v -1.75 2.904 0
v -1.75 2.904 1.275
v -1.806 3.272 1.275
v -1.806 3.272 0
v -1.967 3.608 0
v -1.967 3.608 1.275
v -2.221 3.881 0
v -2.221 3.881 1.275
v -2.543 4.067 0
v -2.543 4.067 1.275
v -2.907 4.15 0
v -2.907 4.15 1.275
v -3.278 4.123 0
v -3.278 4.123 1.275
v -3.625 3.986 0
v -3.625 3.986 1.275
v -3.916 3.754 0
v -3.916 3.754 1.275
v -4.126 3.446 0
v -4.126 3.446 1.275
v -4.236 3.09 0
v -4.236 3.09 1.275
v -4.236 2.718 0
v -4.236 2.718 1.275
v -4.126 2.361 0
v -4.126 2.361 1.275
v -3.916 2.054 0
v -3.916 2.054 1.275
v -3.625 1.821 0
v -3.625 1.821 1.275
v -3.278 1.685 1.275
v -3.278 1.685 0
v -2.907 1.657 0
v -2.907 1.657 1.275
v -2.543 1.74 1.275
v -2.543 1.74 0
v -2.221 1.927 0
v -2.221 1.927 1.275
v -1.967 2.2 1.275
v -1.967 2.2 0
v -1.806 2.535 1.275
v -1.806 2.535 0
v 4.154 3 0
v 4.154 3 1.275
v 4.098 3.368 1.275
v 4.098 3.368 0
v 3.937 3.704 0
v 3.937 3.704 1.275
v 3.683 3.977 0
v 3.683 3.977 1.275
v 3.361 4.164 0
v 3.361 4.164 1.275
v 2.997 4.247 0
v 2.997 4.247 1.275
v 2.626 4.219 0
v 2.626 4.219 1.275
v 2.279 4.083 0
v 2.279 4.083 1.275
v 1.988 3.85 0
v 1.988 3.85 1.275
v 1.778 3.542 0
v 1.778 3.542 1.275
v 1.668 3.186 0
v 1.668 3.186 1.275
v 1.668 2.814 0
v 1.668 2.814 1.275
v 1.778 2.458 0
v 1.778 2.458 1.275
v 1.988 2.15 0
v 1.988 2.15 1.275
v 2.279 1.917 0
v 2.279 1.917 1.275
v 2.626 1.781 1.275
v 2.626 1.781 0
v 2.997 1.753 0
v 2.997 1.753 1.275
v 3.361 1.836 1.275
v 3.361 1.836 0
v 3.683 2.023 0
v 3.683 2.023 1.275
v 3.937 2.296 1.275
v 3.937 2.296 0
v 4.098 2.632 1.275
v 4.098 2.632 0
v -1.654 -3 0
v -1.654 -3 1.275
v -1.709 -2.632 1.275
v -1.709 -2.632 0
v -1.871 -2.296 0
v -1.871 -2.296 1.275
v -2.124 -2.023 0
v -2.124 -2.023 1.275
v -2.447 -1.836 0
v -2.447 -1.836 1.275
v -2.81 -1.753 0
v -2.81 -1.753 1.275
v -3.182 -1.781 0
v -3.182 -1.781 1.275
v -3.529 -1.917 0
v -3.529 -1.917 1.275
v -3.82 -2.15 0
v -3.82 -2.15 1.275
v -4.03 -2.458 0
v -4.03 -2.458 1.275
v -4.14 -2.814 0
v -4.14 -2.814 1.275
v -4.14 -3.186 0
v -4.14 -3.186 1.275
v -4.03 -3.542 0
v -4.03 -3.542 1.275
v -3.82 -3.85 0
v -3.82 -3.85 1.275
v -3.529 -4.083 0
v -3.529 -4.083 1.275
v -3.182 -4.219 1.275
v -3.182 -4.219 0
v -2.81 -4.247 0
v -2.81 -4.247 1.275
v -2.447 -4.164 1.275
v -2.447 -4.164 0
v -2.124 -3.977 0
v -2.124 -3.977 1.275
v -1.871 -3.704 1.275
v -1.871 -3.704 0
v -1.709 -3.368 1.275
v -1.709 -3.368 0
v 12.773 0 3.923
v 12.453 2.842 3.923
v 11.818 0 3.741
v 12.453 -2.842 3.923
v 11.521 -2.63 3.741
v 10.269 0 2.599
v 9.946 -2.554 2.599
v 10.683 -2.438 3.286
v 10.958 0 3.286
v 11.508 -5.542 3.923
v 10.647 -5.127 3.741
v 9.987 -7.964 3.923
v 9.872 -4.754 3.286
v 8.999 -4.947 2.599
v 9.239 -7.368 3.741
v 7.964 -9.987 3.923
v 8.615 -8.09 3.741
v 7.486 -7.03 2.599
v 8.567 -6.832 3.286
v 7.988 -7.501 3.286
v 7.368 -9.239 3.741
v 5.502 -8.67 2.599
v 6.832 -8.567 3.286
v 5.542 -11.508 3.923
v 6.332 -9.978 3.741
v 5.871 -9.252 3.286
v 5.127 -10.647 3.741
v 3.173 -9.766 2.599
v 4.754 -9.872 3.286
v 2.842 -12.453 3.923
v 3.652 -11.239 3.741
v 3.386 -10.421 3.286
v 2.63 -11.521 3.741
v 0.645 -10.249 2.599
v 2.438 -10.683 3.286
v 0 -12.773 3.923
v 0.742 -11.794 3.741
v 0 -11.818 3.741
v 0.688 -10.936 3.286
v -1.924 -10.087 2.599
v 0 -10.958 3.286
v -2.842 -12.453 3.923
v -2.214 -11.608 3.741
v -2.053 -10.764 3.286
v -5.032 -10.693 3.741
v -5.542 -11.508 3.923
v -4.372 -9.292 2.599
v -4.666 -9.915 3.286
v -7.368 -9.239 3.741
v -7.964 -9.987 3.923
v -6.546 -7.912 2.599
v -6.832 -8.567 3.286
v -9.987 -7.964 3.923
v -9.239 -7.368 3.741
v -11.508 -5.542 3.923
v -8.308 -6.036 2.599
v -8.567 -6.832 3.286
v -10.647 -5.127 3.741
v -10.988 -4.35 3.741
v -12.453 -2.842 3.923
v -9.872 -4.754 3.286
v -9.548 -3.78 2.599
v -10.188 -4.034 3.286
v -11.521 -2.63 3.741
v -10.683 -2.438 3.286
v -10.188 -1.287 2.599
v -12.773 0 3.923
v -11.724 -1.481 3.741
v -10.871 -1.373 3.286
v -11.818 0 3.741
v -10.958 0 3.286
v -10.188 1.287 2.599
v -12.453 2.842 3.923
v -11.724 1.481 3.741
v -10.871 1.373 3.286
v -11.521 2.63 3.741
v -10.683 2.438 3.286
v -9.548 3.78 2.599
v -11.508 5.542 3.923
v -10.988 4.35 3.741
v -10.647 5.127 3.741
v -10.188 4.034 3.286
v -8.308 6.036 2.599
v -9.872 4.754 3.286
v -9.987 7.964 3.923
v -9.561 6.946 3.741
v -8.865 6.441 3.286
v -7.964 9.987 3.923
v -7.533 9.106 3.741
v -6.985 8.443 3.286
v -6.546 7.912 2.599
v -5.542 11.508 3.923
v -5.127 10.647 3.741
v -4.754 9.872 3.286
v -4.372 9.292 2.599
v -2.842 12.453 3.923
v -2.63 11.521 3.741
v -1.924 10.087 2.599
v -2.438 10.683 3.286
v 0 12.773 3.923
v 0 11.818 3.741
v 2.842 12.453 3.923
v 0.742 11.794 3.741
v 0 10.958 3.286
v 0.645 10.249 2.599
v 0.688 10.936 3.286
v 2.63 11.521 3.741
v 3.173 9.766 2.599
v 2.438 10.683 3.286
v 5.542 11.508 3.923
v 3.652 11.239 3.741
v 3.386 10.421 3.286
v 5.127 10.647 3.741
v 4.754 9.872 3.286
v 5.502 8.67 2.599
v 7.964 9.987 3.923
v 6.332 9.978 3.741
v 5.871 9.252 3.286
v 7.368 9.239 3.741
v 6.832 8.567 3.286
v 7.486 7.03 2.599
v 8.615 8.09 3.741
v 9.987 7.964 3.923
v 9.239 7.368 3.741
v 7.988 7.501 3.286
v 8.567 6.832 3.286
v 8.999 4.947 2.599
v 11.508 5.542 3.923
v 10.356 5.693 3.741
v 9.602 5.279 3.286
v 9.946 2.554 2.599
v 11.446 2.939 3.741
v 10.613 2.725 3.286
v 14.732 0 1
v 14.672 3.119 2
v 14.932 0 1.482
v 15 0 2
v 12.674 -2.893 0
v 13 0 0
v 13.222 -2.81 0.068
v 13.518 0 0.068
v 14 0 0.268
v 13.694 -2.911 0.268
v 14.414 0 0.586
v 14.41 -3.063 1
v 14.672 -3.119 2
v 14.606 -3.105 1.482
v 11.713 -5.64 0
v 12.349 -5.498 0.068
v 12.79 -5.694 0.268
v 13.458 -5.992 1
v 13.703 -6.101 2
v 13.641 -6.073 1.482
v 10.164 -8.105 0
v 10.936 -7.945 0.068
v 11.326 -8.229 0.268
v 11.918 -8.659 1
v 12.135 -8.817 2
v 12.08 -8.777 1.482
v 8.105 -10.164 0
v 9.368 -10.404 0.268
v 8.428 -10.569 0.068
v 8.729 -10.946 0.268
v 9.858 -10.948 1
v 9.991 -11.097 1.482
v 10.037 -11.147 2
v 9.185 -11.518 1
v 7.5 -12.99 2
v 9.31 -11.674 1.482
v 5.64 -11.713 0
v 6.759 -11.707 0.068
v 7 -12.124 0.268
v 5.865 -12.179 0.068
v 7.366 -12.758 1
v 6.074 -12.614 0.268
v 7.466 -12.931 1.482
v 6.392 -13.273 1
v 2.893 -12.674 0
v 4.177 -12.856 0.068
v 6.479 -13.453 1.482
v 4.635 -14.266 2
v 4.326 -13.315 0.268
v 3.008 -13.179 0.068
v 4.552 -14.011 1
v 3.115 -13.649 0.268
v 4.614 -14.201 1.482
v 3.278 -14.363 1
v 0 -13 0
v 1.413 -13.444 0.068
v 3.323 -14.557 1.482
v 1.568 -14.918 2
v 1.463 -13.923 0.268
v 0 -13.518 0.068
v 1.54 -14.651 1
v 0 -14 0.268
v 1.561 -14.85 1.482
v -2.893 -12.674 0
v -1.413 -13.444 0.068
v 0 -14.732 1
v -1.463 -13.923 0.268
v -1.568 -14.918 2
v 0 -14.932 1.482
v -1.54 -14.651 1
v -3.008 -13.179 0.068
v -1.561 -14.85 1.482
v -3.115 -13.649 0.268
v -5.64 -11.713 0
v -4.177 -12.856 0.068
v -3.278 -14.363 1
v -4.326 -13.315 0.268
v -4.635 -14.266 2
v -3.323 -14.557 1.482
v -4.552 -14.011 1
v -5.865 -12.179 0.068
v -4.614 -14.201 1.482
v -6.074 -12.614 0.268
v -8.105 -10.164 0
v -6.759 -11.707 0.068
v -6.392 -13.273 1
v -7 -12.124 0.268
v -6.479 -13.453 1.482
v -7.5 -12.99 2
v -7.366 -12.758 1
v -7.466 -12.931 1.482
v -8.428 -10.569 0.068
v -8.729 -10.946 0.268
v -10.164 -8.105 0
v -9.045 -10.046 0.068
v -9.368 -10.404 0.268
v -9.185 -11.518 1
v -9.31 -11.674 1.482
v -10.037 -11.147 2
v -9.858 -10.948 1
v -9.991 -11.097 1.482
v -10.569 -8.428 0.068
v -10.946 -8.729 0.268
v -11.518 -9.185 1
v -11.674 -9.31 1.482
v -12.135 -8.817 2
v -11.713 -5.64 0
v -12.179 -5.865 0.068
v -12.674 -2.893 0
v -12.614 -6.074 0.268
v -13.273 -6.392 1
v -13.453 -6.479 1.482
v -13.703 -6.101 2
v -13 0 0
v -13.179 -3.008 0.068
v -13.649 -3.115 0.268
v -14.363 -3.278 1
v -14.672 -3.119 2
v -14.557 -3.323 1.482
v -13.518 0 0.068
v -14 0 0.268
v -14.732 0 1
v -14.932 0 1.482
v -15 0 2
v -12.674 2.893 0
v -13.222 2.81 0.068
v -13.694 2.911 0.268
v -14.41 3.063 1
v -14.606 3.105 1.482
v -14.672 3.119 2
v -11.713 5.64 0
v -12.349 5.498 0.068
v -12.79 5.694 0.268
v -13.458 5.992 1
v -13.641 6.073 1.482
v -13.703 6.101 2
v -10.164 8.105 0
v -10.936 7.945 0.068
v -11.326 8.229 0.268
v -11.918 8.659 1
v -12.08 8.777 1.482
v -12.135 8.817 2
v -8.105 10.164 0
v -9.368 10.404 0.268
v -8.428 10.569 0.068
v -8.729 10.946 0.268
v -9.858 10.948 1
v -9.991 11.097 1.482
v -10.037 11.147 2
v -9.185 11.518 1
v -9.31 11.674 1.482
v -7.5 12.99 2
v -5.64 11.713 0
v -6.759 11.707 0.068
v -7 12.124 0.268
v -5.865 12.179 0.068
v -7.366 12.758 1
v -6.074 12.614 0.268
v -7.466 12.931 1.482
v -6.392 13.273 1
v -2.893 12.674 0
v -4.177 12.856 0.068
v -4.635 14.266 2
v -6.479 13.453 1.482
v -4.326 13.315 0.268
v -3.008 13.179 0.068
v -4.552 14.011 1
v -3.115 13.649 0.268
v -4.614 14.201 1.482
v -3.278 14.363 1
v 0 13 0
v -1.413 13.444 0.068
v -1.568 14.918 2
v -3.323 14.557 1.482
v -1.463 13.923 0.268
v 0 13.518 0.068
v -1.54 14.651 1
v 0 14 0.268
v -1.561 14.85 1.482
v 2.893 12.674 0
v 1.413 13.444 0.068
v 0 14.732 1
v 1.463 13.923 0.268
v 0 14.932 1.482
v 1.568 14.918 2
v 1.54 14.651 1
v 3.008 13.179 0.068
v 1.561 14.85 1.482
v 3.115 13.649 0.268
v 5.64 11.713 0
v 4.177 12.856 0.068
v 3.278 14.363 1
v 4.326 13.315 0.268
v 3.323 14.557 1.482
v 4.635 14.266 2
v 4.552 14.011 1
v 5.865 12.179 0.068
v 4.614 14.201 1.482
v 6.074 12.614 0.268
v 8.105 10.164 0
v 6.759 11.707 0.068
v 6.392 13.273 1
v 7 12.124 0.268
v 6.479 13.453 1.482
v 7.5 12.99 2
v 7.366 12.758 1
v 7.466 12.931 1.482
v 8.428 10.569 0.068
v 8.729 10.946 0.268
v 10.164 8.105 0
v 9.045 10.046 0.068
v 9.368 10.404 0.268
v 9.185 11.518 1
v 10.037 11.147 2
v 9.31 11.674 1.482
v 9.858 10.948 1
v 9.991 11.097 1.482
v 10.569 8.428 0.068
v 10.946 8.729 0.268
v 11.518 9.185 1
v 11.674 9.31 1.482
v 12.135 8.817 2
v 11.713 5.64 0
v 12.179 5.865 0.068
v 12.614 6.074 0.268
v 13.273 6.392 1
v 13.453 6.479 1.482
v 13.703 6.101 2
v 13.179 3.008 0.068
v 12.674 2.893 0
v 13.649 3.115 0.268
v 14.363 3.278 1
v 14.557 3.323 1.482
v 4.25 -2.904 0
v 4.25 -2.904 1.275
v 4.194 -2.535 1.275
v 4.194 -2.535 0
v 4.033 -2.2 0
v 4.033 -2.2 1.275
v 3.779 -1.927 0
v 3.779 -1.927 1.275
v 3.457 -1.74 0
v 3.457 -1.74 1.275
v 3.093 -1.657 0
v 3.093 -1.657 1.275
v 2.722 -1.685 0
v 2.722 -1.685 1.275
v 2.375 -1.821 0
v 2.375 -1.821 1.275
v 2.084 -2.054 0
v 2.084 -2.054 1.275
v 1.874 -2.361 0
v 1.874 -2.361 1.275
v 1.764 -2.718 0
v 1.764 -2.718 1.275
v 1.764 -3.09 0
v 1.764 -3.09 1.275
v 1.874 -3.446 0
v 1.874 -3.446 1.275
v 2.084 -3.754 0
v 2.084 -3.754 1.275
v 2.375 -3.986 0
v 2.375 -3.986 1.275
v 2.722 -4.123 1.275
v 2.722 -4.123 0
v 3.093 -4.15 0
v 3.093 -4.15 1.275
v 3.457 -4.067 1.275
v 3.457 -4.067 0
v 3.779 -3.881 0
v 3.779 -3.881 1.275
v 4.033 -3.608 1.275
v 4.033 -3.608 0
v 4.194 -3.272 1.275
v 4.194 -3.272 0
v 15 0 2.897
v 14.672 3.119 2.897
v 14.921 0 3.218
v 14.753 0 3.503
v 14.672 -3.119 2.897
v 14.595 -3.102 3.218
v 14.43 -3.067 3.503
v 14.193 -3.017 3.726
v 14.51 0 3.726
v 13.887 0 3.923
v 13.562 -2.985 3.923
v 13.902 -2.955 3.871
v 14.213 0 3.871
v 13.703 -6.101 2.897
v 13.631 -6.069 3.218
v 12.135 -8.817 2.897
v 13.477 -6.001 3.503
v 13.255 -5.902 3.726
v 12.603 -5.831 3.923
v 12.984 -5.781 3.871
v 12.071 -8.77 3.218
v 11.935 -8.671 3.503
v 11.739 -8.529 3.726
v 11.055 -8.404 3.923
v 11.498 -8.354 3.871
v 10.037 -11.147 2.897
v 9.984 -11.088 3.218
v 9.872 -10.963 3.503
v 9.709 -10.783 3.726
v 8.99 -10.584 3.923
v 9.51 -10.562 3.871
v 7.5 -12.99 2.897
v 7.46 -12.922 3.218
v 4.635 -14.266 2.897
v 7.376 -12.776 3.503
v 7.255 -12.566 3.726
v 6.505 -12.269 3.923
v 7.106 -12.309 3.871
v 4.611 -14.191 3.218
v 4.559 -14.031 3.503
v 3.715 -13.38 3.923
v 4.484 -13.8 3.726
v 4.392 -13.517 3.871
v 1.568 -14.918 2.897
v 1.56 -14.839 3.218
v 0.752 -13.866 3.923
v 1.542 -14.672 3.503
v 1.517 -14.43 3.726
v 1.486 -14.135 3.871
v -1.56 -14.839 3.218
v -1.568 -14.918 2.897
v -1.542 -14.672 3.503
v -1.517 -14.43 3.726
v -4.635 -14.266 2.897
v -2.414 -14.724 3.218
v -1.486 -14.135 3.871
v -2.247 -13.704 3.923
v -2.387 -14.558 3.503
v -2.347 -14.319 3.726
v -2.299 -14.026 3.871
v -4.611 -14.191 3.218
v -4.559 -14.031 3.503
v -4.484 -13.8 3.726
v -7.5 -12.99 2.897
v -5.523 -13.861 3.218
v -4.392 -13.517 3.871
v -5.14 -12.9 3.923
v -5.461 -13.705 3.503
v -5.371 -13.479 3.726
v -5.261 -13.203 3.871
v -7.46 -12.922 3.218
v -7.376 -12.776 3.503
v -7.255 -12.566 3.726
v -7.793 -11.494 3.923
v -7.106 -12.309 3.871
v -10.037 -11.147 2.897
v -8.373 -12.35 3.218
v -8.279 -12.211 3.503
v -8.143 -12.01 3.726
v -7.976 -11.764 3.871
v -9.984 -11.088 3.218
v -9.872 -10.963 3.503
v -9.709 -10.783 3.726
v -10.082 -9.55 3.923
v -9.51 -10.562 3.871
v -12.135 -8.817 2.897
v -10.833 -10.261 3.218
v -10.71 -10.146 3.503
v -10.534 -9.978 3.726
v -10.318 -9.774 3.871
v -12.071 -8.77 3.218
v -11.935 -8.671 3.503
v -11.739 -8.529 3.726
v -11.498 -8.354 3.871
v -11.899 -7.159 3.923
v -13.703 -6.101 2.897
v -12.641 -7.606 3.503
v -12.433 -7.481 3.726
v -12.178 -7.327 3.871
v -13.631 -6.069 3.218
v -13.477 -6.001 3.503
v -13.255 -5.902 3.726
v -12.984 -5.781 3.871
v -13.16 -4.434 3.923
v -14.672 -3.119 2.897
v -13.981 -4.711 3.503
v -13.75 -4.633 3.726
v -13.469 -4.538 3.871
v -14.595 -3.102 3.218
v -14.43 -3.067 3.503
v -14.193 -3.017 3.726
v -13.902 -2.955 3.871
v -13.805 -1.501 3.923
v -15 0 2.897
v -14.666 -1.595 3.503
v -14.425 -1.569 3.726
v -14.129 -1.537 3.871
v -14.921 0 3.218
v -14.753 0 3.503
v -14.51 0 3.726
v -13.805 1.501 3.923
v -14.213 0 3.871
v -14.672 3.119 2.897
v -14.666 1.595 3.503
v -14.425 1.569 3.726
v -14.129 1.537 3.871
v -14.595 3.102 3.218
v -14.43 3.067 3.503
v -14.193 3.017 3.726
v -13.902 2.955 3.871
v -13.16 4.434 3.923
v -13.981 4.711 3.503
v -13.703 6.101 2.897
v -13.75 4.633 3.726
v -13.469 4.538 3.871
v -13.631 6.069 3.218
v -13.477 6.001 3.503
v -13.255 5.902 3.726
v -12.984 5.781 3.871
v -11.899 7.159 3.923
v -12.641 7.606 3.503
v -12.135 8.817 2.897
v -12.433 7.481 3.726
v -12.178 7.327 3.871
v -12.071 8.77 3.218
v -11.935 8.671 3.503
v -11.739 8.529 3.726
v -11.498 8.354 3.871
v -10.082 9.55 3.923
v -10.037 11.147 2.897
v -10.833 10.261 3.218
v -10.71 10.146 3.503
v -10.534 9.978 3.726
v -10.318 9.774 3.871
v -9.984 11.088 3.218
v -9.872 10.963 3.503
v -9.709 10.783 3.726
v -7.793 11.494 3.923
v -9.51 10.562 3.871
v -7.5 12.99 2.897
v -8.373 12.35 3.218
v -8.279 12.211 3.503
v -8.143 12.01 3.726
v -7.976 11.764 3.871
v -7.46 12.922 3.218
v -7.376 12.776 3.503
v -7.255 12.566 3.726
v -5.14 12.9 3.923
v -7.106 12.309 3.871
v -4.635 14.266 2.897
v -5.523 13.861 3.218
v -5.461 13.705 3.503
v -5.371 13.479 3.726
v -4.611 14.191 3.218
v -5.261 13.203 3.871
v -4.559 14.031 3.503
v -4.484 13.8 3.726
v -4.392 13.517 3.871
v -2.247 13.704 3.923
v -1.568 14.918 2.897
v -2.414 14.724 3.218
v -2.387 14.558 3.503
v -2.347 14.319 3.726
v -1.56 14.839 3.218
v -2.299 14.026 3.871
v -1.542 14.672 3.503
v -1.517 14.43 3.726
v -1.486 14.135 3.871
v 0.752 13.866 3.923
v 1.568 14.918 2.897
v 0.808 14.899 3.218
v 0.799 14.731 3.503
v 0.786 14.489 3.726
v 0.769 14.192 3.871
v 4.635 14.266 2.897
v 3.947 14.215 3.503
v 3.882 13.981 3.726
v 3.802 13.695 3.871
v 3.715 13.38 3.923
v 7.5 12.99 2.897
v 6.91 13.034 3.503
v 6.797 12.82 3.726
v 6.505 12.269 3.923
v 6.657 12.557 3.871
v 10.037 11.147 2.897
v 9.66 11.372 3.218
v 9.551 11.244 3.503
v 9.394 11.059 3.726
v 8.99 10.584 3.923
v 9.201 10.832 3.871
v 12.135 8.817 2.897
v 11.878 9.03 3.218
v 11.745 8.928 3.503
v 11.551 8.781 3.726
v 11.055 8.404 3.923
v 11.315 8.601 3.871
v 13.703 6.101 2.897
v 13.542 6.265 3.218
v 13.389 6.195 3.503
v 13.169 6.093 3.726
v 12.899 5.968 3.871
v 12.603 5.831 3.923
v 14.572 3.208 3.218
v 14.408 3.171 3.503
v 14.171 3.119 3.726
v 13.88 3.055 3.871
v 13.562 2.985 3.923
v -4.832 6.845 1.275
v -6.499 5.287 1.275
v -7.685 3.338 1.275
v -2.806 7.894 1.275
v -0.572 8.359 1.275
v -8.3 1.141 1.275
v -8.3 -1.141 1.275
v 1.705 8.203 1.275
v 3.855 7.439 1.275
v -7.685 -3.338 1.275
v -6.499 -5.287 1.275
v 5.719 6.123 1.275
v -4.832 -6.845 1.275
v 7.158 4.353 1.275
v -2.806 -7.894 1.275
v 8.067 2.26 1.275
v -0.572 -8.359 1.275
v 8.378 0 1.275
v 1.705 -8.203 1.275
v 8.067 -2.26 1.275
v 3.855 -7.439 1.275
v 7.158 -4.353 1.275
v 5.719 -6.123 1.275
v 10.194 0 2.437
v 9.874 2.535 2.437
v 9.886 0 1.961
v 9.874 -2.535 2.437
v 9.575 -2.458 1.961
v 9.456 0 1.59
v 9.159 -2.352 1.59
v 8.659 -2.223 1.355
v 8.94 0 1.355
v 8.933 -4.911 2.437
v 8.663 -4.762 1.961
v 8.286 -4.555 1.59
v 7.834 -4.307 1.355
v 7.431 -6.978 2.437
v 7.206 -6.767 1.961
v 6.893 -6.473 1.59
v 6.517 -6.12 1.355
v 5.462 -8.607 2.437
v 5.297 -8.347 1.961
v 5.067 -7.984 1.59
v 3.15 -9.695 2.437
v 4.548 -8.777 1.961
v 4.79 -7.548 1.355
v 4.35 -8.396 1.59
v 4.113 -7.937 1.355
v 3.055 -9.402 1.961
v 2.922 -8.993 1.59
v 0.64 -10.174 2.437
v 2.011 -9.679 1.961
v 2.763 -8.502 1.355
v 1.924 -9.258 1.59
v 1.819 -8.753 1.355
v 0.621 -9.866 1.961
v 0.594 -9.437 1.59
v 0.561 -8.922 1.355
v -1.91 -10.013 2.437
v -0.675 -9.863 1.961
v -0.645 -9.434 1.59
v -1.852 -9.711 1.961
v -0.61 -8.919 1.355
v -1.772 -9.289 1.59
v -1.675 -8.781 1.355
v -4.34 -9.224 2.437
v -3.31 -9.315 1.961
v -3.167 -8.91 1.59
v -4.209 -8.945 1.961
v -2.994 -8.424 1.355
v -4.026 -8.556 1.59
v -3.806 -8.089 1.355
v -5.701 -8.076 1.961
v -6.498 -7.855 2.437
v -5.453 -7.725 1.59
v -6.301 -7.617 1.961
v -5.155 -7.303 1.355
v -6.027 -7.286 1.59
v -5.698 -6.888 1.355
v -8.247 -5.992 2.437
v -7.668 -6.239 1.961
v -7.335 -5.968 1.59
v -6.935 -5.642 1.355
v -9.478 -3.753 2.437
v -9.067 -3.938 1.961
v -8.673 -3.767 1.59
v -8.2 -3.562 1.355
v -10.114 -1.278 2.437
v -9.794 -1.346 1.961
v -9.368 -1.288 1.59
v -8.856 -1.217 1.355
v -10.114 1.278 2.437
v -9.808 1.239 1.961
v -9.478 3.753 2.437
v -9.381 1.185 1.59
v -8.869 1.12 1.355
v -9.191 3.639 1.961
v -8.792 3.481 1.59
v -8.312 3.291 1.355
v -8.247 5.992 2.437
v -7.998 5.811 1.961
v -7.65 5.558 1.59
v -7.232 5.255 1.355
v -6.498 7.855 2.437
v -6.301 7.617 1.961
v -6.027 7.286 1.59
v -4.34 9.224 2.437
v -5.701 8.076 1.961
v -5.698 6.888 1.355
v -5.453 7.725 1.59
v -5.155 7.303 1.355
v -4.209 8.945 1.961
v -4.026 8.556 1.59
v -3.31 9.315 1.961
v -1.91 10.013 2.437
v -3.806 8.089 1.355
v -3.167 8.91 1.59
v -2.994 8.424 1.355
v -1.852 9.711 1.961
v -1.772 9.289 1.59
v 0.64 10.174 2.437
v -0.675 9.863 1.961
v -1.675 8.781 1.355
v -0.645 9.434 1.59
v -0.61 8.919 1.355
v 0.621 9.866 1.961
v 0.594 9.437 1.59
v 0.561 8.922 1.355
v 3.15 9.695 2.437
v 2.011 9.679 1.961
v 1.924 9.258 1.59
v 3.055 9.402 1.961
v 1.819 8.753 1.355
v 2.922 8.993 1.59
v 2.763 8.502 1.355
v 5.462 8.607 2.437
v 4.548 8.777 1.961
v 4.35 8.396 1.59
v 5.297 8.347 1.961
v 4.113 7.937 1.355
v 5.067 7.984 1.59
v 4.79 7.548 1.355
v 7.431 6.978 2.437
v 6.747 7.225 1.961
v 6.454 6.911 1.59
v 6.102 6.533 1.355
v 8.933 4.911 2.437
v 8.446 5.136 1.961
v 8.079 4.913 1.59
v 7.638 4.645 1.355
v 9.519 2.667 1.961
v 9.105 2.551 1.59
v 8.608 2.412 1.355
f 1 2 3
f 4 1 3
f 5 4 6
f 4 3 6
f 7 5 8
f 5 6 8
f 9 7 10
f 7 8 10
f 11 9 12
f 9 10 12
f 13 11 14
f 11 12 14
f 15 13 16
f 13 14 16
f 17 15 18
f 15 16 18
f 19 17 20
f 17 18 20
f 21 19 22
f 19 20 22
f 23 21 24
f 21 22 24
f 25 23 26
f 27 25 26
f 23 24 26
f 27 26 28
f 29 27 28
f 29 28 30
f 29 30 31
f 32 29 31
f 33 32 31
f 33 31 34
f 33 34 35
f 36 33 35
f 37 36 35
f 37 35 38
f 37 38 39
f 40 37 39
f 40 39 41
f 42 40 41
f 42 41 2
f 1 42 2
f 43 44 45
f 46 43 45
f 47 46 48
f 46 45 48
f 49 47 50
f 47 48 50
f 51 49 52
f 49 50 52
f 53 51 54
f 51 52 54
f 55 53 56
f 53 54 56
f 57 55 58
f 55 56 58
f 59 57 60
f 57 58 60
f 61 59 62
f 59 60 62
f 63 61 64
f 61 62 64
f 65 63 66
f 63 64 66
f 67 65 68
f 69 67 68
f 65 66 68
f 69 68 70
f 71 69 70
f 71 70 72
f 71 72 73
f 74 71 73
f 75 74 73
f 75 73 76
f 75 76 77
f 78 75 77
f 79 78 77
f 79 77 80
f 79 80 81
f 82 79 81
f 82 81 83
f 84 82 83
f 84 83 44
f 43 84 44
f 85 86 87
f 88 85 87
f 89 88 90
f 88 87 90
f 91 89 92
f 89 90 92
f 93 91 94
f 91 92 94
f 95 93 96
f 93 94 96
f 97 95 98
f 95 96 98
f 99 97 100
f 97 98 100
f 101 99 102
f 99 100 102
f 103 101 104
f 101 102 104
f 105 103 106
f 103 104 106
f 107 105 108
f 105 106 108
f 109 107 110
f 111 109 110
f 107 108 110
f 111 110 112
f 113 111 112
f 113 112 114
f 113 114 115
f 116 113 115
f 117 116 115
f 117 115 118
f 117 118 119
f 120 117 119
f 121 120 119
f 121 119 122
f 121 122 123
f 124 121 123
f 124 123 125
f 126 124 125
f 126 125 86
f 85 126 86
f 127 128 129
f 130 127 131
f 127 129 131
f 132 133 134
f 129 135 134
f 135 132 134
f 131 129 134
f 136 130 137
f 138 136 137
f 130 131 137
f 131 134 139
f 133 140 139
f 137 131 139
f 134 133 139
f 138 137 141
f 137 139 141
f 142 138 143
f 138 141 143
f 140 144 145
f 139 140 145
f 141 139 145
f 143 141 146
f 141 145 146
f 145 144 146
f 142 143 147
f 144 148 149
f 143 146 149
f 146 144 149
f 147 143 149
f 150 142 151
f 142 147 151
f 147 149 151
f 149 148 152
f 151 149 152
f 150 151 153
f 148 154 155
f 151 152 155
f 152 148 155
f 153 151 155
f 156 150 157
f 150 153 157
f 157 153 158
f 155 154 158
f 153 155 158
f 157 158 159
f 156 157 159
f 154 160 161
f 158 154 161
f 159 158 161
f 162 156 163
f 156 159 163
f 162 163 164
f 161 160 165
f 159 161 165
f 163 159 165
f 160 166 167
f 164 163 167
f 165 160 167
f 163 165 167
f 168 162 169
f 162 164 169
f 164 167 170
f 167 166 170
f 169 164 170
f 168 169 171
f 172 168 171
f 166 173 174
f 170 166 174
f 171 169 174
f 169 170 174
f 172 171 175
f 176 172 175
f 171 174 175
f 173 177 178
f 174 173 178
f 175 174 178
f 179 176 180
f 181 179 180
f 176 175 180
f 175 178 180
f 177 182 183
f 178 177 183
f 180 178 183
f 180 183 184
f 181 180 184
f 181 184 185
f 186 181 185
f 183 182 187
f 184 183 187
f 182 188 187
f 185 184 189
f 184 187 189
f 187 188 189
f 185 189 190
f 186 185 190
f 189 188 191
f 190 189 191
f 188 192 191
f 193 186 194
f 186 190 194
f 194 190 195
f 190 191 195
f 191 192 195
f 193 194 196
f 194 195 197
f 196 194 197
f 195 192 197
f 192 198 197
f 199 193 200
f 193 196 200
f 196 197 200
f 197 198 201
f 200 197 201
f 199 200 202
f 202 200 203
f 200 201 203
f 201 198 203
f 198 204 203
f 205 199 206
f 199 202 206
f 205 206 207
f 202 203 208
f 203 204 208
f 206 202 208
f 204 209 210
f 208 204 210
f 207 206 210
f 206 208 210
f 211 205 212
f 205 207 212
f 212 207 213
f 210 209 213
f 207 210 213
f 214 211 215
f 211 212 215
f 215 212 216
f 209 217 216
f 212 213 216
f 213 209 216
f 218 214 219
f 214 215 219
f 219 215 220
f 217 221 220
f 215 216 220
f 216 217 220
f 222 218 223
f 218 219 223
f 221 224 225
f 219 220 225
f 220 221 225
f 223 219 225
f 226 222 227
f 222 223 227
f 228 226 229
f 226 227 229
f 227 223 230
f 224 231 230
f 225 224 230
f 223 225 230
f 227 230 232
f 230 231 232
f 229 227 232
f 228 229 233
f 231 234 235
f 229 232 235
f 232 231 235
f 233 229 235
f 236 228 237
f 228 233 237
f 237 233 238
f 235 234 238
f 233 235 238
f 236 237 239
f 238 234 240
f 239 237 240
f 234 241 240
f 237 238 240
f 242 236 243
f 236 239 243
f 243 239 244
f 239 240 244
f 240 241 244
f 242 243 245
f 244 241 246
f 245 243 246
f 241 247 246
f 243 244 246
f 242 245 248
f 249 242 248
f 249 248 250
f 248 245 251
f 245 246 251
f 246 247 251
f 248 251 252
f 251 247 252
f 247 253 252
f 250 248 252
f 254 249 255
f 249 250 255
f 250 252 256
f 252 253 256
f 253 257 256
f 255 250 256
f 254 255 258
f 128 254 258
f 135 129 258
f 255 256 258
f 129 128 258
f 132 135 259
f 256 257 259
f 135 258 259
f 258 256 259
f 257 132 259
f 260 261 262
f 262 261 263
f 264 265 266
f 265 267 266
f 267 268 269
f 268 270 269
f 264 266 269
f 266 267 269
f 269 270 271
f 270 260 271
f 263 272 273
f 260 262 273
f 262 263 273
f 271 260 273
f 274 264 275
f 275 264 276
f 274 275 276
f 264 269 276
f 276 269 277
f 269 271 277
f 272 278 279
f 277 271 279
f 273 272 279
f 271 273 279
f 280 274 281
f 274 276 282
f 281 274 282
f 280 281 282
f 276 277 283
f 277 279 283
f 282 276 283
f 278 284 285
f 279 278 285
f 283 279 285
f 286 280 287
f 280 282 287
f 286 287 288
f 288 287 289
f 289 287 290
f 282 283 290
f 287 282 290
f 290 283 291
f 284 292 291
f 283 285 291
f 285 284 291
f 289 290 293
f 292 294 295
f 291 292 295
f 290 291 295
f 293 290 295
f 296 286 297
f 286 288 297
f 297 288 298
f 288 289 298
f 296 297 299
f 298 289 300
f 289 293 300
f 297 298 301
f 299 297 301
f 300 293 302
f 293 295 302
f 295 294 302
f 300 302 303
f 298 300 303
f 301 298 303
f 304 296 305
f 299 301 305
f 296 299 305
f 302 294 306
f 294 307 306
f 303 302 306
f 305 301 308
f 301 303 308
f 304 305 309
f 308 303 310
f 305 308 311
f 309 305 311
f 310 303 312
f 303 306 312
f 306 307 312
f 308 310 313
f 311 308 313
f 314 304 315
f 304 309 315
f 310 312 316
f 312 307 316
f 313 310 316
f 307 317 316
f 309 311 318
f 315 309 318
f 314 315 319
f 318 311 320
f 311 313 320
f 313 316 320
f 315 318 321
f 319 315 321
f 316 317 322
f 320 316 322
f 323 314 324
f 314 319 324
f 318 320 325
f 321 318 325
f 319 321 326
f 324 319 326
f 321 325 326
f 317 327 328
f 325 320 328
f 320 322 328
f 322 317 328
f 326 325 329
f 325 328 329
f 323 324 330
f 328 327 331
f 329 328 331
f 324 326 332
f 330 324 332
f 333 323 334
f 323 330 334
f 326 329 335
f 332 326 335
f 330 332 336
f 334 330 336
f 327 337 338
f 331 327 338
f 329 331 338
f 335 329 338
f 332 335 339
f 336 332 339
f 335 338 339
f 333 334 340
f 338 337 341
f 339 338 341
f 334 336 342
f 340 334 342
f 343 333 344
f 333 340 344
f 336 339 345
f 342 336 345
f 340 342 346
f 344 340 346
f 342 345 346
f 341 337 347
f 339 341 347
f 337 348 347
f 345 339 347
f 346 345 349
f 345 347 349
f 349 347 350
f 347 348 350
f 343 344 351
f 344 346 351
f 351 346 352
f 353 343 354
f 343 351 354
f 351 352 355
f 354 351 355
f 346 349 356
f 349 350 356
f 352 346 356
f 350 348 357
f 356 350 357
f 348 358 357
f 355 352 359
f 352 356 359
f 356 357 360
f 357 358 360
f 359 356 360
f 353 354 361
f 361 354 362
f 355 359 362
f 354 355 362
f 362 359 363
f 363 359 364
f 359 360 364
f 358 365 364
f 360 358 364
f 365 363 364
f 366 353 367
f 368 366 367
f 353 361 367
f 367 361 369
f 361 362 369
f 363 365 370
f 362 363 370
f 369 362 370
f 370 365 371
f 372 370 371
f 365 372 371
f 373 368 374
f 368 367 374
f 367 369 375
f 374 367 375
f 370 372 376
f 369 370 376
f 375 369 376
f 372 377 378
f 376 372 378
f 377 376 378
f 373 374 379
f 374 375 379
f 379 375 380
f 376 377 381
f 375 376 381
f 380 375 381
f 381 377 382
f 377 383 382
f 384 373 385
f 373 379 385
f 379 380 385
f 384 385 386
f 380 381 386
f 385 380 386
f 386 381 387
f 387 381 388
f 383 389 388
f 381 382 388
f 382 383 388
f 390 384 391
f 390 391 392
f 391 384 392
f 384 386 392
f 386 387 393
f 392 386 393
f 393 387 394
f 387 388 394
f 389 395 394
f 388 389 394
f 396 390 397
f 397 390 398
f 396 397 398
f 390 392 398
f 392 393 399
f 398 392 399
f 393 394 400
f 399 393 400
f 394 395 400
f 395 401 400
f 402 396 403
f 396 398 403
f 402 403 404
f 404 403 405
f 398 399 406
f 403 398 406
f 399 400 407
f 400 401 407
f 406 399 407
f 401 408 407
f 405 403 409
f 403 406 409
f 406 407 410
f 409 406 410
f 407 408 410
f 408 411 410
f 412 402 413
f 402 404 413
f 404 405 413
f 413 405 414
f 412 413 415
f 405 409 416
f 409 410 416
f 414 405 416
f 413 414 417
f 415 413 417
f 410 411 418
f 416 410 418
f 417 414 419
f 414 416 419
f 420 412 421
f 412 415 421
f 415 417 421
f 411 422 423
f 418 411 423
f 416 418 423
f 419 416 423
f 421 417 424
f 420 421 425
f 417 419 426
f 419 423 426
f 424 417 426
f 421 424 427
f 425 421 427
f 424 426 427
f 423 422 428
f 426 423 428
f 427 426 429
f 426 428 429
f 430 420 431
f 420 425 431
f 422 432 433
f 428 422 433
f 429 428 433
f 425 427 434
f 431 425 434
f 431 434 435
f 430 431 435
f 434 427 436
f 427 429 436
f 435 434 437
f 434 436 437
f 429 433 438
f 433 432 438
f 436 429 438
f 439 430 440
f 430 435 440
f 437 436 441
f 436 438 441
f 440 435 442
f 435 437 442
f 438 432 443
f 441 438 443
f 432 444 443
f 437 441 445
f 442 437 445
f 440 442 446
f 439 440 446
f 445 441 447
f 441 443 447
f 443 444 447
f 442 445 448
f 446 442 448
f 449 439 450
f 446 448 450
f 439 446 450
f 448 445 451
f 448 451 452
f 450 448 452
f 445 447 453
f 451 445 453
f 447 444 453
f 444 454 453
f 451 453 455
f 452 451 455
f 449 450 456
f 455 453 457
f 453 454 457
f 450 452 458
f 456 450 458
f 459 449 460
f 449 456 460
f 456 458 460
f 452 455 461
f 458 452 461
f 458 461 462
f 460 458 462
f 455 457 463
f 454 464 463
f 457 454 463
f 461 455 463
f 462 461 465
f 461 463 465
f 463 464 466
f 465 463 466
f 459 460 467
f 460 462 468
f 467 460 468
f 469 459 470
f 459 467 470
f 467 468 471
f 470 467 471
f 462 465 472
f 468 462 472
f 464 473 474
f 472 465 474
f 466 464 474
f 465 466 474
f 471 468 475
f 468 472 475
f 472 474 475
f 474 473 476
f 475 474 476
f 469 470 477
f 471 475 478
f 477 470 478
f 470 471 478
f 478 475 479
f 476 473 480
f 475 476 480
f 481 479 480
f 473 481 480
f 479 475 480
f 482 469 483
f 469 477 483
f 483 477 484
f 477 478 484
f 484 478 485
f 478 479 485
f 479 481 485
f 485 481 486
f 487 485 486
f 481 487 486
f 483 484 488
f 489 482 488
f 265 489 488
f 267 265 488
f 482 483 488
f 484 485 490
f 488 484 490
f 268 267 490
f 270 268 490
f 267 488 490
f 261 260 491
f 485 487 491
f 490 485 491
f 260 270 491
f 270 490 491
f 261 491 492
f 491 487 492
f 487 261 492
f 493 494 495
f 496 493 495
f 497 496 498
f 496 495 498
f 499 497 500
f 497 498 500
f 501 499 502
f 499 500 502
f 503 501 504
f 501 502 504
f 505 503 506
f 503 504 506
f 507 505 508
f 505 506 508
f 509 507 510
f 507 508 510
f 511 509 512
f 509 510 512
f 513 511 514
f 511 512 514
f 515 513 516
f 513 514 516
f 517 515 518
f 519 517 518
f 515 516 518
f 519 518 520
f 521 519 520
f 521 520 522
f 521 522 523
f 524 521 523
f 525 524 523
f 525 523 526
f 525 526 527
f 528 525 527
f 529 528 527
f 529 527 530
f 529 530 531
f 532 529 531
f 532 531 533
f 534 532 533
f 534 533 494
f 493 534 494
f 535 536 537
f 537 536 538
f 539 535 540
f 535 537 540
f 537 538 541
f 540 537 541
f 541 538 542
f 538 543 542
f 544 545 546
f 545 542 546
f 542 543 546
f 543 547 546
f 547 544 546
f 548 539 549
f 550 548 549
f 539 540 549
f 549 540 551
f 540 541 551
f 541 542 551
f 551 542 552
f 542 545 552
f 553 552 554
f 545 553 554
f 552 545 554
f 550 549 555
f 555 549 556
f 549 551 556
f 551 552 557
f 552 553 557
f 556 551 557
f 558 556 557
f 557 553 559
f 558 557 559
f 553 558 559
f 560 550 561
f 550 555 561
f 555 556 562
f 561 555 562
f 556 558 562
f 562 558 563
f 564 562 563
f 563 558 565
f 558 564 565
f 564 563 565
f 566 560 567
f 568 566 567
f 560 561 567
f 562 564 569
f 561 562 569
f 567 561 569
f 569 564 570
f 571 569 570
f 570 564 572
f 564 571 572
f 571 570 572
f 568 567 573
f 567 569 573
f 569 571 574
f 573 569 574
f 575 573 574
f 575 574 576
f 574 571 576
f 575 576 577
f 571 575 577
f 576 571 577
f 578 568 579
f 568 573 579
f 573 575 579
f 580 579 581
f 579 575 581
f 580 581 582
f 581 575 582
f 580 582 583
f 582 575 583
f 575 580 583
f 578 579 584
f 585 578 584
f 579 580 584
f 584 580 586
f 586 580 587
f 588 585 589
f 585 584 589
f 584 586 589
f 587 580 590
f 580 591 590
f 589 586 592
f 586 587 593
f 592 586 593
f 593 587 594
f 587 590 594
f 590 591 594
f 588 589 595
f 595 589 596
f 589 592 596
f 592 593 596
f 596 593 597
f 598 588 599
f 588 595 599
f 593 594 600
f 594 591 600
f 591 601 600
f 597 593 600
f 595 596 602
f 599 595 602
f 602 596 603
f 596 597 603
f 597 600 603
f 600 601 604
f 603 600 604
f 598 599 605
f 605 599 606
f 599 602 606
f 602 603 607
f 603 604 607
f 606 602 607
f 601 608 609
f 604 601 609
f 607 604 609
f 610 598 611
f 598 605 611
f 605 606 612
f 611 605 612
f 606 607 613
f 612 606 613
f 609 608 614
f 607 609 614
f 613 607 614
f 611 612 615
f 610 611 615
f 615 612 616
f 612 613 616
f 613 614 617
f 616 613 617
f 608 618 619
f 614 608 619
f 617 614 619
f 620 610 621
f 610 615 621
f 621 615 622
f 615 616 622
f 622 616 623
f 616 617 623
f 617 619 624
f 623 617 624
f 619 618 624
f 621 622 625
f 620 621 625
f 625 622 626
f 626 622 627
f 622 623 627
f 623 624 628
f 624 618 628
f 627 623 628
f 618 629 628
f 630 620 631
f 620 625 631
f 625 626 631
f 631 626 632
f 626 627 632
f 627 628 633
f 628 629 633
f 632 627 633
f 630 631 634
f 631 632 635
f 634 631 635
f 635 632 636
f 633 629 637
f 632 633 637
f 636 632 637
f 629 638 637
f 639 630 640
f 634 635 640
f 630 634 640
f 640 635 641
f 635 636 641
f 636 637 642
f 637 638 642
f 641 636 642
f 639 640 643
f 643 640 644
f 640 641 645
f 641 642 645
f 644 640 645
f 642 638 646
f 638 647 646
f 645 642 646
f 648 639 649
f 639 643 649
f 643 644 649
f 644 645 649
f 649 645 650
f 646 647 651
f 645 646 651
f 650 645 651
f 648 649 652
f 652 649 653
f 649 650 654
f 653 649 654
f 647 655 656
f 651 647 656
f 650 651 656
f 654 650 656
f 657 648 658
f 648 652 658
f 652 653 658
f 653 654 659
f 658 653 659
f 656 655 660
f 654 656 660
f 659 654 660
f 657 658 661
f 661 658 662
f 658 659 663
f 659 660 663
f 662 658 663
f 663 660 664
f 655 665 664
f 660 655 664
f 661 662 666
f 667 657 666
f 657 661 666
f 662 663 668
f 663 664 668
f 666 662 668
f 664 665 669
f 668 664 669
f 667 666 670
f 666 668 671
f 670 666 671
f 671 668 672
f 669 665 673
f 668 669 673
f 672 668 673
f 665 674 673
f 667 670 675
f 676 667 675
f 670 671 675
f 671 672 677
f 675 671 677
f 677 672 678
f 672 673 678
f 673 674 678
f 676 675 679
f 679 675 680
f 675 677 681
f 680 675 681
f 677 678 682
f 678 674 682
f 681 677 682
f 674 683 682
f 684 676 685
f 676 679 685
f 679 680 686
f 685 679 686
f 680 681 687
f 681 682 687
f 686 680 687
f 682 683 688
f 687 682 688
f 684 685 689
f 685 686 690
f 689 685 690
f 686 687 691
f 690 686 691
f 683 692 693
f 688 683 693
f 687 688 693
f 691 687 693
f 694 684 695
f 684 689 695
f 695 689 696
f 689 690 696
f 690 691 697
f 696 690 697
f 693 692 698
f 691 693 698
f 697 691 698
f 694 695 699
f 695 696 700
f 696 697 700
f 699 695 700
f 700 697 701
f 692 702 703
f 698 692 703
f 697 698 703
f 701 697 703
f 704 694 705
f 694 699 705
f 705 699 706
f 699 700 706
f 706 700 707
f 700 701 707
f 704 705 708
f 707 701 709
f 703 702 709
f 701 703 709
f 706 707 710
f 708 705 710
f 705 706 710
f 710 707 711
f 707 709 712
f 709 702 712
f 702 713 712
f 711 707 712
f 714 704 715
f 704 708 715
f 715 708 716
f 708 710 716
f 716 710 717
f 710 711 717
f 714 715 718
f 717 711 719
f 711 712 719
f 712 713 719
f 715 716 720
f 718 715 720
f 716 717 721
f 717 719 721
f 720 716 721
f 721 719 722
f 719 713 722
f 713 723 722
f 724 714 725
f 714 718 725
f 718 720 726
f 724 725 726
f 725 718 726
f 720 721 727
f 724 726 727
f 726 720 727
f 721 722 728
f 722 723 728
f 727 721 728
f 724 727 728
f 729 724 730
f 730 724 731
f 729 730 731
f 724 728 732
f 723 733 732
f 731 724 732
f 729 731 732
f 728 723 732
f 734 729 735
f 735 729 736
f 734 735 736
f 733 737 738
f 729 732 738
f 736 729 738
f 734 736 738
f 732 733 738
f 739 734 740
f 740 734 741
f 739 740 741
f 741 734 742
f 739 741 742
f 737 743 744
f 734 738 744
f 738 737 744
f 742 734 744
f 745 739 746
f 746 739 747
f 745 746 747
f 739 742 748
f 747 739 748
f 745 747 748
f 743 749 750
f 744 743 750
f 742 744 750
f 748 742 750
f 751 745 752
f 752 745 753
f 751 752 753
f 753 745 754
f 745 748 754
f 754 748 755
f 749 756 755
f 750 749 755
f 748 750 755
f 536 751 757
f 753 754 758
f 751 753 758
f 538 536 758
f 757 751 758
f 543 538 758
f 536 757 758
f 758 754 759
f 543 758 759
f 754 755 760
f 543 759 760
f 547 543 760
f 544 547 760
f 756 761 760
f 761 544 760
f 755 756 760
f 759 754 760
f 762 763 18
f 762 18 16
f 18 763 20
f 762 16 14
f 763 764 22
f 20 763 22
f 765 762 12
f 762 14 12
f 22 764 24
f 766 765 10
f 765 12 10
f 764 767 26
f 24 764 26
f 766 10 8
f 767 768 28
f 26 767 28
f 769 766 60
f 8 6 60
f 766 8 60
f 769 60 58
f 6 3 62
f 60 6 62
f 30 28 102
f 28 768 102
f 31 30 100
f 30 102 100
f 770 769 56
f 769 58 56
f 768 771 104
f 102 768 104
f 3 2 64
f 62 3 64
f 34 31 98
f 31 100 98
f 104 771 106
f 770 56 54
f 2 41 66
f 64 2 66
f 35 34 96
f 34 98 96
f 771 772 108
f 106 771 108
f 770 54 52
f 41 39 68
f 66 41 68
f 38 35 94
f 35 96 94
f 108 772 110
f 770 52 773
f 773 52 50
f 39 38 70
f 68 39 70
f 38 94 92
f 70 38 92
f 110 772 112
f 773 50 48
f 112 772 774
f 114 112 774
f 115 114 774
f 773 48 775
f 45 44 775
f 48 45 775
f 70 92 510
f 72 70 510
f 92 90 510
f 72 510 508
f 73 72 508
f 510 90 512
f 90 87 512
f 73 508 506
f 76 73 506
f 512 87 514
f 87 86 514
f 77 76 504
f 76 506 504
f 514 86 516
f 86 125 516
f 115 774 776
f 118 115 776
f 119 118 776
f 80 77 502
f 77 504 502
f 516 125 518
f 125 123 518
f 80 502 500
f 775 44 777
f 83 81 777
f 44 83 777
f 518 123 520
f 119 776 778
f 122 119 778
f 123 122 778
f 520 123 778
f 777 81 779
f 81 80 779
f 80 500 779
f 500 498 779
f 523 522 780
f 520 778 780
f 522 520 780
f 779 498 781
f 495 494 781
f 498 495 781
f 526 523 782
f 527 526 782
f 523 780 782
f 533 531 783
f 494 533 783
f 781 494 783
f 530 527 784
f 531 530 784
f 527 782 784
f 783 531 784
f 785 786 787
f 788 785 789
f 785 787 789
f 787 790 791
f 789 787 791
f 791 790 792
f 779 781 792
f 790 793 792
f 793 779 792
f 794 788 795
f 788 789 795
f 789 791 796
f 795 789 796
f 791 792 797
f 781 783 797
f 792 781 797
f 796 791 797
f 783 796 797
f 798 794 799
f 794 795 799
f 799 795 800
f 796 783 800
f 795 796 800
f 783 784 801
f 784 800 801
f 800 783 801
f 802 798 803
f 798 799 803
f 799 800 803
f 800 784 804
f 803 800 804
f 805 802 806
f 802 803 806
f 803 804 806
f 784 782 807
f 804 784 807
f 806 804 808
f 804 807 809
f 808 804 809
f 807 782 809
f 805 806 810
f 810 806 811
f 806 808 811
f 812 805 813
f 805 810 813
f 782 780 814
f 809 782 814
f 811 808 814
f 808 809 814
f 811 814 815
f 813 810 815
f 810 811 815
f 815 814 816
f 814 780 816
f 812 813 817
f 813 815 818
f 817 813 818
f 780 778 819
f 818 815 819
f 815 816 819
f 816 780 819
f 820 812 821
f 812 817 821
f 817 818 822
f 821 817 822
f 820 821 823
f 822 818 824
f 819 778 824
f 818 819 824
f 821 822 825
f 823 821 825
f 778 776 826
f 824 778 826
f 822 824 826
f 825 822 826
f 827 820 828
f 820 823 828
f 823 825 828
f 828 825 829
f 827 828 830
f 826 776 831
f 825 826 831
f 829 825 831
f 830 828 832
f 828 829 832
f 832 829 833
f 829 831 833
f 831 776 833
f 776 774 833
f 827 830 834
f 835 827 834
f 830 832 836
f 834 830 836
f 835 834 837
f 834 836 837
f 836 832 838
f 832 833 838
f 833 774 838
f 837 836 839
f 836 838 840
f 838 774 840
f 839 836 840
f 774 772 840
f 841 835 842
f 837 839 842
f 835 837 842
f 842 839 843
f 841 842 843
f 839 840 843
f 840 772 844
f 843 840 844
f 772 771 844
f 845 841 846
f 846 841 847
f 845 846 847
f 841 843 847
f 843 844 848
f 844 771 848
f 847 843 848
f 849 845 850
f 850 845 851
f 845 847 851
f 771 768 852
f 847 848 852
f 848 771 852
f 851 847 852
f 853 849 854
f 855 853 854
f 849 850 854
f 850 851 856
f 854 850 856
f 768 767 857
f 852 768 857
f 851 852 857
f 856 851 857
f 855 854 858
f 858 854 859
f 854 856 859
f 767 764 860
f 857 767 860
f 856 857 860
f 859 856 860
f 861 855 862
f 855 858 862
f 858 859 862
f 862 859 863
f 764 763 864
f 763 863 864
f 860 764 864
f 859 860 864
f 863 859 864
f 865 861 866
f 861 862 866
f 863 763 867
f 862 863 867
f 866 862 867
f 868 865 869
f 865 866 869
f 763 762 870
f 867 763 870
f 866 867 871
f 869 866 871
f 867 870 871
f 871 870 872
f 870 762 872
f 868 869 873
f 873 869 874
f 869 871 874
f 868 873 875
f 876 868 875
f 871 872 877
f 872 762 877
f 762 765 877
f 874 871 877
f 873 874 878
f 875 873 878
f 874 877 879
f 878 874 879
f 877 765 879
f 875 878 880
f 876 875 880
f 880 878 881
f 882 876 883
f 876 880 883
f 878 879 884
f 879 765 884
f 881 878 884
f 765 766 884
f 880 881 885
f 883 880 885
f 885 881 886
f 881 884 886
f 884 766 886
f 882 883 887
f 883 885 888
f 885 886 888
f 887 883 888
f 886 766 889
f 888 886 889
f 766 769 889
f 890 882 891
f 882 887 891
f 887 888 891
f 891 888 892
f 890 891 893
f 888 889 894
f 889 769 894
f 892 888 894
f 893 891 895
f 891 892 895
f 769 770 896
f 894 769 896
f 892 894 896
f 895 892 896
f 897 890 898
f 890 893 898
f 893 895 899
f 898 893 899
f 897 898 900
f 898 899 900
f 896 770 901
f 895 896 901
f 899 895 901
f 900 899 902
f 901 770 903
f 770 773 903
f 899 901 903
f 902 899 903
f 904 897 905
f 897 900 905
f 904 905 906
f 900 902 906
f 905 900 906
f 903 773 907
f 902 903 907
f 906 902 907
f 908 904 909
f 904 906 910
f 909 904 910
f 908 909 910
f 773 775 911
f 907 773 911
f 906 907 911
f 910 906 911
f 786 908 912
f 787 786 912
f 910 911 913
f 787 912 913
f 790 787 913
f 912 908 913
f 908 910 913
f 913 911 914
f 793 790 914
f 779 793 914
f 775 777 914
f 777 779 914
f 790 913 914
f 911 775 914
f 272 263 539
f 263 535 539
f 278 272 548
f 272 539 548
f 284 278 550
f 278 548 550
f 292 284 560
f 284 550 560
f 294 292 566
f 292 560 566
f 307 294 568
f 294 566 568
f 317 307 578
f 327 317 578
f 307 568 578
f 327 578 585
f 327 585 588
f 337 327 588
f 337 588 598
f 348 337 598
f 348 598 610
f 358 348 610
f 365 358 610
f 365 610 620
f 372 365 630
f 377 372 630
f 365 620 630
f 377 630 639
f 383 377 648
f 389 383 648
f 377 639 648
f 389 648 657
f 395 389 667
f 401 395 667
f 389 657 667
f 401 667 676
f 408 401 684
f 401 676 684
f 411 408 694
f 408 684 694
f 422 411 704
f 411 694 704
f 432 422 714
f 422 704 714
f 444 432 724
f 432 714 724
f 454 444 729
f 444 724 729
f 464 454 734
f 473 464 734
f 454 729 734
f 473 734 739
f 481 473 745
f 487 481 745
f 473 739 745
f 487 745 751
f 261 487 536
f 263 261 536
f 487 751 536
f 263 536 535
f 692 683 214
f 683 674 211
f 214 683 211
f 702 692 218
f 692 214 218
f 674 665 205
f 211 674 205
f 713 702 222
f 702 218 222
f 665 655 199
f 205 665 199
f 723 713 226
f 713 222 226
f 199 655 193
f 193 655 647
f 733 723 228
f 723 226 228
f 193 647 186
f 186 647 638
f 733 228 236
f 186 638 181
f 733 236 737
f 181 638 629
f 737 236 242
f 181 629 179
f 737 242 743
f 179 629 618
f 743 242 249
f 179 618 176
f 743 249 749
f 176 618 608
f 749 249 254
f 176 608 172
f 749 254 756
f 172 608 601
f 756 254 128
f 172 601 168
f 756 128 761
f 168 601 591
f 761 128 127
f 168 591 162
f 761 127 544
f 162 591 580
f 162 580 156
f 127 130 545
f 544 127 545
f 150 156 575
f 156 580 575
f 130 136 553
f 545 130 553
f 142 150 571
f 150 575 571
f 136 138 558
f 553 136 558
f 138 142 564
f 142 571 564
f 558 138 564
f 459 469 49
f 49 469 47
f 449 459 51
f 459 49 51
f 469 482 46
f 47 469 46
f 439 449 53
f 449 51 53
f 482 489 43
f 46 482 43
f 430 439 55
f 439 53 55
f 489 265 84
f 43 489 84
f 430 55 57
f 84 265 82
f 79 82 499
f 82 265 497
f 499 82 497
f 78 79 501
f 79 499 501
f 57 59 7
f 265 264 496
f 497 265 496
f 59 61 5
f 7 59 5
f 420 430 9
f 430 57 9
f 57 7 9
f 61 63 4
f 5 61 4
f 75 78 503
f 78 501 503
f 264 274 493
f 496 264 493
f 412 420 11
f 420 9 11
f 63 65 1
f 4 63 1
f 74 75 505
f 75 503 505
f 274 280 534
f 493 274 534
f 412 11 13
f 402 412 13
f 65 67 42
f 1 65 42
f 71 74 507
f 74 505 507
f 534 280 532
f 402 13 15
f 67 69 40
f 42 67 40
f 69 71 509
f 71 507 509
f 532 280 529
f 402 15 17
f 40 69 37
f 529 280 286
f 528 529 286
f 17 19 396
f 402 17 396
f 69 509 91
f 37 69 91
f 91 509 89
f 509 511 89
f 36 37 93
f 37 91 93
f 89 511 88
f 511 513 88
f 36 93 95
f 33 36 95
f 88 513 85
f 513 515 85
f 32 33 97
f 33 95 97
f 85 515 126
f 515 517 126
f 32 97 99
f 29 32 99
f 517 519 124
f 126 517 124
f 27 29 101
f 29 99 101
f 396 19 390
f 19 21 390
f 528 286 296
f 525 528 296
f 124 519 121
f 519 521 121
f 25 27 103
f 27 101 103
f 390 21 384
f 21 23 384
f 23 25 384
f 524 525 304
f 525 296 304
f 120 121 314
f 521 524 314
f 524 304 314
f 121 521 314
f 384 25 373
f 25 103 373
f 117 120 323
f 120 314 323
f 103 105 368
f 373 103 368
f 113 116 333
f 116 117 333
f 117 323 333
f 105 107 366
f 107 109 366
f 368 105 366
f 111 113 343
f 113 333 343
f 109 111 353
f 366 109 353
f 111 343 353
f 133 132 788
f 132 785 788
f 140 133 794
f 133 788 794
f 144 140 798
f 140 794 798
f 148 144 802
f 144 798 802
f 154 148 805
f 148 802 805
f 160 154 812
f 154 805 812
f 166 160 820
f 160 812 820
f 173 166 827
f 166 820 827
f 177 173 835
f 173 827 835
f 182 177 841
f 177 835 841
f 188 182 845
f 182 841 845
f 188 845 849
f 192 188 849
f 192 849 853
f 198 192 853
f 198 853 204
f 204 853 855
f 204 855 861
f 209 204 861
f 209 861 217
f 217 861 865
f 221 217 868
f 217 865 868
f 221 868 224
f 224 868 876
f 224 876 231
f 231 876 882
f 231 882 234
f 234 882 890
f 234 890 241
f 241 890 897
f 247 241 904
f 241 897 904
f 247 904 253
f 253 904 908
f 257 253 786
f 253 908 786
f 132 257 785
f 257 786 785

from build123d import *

# Parameters (mm, degrees)
F2_R     = 1.25
F3_DEPTH = 5.1


# Not quite as in the source:
# - a feature names something its author has since deleted; it is built from what else it names


with BuildPart() as f1:
    # F0 (on Front) → F1 (revolve)
    with BuildSketch(Plane.XZ):
        with BuildLine():
            Line((0, 1.2750519672), (0, 0))
            Line((0, 0), (13, 0))
            ThreePointArc((13, 0), (14.4142135624, 0.5857864376), (15, 2))
            Line((15, 2), (15, 2.8974551242))
            ThreePointArc((15, 2.8974551242), (14.6395651733, 3.6234077181), (13.8866530545, 3.9234806662))
            Line((13.8866530545, 3.9234806662), (12.773306109, 3.9234806662))
            ThreePointArc((12.773306109, 3.9234806662), (11.3706801368, 3.5459784592), (10.2690433302, 2.5992663167))
            Line((10.2690433302, 2.5992663167), (10.1940094677, 2.4367391619))
            ThreePointArc((10.1940094677, 2.4367391619), (9.4559973183, 1.5903226699), (8.378181381, 1.2750519672))
            Line((8.378181381, 1.2750519672), (0, 1.2750519672))
        make_face()
    revolve(axis=Axis((0, 0, 0.6375259836), (0, 0, -1)))

    # F2 (on face) → F3 (cut)
    with BuildSketch(Plane.XY.offset(1.2750519672)):
        with Locations((3.0000000261, -2.9038460925)):
            Circle(F2_R)
        with Locations((2.9038460925, 3.0000000261)):
            Circle(F2_R)
        with Locations((-3.0000000261, 2.9038460925)):
            Circle(F2_R)
        with Locations((-2.9038460925, -3.0000000261)):
            Circle(F2_R)
    extrude(amount=-F3_DEPTH, mode=Mode.SUBTRACT)


solid = f1.part
